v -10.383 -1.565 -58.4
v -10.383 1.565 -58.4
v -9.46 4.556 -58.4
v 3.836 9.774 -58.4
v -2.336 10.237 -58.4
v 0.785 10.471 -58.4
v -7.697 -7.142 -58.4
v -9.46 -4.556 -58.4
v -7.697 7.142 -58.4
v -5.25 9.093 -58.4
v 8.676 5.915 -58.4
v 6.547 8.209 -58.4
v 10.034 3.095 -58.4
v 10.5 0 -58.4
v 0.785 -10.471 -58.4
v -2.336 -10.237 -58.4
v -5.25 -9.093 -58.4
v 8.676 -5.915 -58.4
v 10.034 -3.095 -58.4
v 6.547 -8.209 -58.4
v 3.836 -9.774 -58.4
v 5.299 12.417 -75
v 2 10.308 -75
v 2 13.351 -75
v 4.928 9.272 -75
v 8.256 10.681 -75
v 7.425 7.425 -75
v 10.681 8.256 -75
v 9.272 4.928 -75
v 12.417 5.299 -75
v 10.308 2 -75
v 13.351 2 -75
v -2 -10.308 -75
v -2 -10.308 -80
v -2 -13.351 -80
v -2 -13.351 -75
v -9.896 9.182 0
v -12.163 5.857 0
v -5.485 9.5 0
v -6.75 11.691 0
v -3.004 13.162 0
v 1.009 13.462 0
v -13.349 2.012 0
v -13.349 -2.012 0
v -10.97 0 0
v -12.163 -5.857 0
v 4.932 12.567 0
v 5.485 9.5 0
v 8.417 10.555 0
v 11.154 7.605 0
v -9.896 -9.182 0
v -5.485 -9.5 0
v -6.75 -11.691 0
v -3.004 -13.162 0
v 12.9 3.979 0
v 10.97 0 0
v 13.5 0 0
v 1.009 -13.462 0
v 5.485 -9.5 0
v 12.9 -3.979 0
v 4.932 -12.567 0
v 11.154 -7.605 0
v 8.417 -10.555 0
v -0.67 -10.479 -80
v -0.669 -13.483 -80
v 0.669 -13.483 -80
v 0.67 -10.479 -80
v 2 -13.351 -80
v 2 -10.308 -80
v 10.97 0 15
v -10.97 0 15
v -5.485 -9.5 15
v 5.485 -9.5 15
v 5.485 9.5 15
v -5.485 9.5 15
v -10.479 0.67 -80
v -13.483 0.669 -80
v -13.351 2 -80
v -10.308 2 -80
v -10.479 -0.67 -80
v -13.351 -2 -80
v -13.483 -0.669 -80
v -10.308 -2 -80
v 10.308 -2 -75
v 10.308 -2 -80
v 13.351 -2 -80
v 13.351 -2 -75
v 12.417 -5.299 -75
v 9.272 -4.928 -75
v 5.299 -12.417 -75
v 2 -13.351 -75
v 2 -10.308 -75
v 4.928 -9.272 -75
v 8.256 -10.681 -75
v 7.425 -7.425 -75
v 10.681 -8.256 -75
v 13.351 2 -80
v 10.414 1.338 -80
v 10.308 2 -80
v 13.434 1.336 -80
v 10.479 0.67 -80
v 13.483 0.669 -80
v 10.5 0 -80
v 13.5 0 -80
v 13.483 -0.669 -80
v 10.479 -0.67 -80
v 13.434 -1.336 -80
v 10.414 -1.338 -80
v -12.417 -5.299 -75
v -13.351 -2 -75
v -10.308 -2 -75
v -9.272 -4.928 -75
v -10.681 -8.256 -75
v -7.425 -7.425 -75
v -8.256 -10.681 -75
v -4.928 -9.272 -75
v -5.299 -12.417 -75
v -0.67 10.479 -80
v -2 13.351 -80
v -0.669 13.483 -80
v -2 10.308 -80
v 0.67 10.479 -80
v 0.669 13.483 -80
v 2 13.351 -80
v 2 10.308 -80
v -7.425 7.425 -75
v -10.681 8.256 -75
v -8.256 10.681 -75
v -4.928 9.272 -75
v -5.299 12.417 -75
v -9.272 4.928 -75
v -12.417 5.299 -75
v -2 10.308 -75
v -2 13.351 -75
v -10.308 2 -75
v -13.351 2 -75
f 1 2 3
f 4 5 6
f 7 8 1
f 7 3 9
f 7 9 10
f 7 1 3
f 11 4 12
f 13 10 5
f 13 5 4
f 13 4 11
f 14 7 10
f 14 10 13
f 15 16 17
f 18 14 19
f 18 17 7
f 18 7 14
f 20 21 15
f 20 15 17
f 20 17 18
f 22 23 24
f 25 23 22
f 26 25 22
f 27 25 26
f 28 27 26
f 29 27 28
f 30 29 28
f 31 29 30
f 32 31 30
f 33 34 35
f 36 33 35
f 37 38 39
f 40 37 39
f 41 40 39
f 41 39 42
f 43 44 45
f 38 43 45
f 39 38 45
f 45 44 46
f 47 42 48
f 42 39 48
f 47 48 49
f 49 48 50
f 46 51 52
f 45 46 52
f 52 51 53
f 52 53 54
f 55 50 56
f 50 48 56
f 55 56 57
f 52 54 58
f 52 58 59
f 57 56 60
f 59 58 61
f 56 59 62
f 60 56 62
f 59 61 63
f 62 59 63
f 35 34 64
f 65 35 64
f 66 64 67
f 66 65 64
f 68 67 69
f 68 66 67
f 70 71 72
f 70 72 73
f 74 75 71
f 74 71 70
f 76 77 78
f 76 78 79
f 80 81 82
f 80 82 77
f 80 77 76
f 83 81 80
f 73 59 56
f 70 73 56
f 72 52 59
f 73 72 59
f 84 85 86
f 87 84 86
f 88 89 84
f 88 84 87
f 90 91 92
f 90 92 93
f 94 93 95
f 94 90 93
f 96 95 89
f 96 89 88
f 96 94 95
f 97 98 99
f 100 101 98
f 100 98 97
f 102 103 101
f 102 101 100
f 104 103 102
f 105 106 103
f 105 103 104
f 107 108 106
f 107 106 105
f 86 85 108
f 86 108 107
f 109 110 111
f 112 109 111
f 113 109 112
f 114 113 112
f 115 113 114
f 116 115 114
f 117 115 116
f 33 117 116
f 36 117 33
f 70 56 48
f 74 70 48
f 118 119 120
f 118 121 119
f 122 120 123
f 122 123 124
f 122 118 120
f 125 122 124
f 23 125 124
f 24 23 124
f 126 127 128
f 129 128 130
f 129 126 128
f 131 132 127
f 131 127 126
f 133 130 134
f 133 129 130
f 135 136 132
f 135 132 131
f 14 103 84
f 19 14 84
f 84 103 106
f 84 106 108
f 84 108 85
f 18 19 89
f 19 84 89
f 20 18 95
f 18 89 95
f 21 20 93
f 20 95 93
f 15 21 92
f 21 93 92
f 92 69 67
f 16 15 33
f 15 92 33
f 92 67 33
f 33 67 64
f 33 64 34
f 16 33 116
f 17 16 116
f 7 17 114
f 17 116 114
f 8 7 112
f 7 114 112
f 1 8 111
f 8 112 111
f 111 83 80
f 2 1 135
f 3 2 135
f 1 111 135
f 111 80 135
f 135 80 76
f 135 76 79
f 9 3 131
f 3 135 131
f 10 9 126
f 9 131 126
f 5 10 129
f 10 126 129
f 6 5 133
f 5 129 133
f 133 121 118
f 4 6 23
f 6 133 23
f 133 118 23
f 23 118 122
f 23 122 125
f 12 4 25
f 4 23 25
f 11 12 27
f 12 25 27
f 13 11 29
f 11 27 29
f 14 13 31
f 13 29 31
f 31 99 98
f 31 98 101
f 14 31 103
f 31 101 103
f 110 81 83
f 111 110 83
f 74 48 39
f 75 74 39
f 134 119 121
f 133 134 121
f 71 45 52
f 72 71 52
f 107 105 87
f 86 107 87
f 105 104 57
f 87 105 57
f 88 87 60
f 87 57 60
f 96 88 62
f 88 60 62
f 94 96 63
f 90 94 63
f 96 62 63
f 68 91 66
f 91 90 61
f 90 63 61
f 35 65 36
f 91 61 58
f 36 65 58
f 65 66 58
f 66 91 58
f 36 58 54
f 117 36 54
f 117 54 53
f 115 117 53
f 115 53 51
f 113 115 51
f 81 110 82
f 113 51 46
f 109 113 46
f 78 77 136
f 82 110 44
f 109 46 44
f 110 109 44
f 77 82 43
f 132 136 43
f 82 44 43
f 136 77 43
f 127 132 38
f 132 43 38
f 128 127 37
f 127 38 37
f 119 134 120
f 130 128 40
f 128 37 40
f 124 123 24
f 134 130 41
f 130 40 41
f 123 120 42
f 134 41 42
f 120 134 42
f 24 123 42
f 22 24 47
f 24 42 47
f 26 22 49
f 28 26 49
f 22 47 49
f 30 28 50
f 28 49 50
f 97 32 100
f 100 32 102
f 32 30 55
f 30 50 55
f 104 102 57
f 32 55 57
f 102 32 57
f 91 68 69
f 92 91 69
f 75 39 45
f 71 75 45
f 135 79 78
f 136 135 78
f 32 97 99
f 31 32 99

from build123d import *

# Parameters (mm, degrees)
F1_DEPTH = 15
F2_R     = 13.5
F3_DEPTH = 80
F4_R     = 10.5
F5_DEPTH = 21.6
F7_DEPTH = 5


with BuildPart() as f1:
    # F0 (on Top) → F1 (new body)
    with BuildSketch(Plane.XY):
        Polygon((-5.484828, 9.5), (-10.969655, 0), (-5.484828, -9.5), (5.484828, -9.5), (10.969655, 0), (5.484828, 9.5), align=None)
    extrude(amount=F1_DEPTH)

    # F2 (on face) → F3 (join)
    with BuildSketch(Plane(origin=(0, 0, 0), x_dir=(1, 0, 0), z_dir=(0, 0, -1))):
        Circle(F2_R)
    extrude(amount=F3_DEPTH)

    # F4 (on face) → F5 (cut)
    with BuildSketch(Plane(origin=(0, 0, -80), x_dir=(1, 0, 0), z_dir=(0, 0, -1))):
        Circle(F4_R)
    extrude(amount=-F5_DEPTH, mode=Mode.SUBTRACT)

    # F6 (on face) → F7 (cut)
    with BuildSketch(Plane(origin=(0, 0, -80), x_dir=(1, 0, 0), z_dir=(0, 0, -1))):
        with BuildLine():
            ThreePointArc((10.307764, -2), (7.424621, -7.424621), (2, -10.307764))
            Line((2, -10.307764), (2, -13.35103))
            ThreePointArc((2, -13.35103), (9.545942, -9.545942), (13.35103, -2))
            Line((13.35103, -2), (10.307764, -2))
        make_face()
        with BuildLine():
            Line((-10.307764, -2), (-13.35103, -2))
            ThreePointArc((-13.35103, -2), (-9.545942, -9.545942), (-2, -13.35103))
            Line((-2, -13.35103), (-2, -10.307764))
            ThreePointArc((-2, -10.307764), (-7.424621, -7.424621), (-10.307764, -2))
        make_face()
        with BuildLine():
            ThreePointArc((-2, 13.35103), (-9.545942, 9.545942), (-13.35103, 2))
            Line((-13.35103, 2), (-10.307764, 2))
            ThreePointArc((-10.307764, 2), (-7.424621, 7.424621), (-2, 10.307764))
            Line((-2, 10.307764), (-2, 13.35103))
        make_face()
        with BuildLine():
            ThreePointArc((13.35103, 2), (9.545942, 9.545942), (2, 13.35103))
            Line((2, 13.35103), (2, 10.307764))
            ThreePointArc((2, 10.307764), (7.424621, 7.424621), (10.307764, 2))
            Line((10.307764, 2), (13.35103, 2))
        make_face()
    extrude(amount=-F7_DEPTH, mode=Mode.SUBTRACT)


solid = f1.part
